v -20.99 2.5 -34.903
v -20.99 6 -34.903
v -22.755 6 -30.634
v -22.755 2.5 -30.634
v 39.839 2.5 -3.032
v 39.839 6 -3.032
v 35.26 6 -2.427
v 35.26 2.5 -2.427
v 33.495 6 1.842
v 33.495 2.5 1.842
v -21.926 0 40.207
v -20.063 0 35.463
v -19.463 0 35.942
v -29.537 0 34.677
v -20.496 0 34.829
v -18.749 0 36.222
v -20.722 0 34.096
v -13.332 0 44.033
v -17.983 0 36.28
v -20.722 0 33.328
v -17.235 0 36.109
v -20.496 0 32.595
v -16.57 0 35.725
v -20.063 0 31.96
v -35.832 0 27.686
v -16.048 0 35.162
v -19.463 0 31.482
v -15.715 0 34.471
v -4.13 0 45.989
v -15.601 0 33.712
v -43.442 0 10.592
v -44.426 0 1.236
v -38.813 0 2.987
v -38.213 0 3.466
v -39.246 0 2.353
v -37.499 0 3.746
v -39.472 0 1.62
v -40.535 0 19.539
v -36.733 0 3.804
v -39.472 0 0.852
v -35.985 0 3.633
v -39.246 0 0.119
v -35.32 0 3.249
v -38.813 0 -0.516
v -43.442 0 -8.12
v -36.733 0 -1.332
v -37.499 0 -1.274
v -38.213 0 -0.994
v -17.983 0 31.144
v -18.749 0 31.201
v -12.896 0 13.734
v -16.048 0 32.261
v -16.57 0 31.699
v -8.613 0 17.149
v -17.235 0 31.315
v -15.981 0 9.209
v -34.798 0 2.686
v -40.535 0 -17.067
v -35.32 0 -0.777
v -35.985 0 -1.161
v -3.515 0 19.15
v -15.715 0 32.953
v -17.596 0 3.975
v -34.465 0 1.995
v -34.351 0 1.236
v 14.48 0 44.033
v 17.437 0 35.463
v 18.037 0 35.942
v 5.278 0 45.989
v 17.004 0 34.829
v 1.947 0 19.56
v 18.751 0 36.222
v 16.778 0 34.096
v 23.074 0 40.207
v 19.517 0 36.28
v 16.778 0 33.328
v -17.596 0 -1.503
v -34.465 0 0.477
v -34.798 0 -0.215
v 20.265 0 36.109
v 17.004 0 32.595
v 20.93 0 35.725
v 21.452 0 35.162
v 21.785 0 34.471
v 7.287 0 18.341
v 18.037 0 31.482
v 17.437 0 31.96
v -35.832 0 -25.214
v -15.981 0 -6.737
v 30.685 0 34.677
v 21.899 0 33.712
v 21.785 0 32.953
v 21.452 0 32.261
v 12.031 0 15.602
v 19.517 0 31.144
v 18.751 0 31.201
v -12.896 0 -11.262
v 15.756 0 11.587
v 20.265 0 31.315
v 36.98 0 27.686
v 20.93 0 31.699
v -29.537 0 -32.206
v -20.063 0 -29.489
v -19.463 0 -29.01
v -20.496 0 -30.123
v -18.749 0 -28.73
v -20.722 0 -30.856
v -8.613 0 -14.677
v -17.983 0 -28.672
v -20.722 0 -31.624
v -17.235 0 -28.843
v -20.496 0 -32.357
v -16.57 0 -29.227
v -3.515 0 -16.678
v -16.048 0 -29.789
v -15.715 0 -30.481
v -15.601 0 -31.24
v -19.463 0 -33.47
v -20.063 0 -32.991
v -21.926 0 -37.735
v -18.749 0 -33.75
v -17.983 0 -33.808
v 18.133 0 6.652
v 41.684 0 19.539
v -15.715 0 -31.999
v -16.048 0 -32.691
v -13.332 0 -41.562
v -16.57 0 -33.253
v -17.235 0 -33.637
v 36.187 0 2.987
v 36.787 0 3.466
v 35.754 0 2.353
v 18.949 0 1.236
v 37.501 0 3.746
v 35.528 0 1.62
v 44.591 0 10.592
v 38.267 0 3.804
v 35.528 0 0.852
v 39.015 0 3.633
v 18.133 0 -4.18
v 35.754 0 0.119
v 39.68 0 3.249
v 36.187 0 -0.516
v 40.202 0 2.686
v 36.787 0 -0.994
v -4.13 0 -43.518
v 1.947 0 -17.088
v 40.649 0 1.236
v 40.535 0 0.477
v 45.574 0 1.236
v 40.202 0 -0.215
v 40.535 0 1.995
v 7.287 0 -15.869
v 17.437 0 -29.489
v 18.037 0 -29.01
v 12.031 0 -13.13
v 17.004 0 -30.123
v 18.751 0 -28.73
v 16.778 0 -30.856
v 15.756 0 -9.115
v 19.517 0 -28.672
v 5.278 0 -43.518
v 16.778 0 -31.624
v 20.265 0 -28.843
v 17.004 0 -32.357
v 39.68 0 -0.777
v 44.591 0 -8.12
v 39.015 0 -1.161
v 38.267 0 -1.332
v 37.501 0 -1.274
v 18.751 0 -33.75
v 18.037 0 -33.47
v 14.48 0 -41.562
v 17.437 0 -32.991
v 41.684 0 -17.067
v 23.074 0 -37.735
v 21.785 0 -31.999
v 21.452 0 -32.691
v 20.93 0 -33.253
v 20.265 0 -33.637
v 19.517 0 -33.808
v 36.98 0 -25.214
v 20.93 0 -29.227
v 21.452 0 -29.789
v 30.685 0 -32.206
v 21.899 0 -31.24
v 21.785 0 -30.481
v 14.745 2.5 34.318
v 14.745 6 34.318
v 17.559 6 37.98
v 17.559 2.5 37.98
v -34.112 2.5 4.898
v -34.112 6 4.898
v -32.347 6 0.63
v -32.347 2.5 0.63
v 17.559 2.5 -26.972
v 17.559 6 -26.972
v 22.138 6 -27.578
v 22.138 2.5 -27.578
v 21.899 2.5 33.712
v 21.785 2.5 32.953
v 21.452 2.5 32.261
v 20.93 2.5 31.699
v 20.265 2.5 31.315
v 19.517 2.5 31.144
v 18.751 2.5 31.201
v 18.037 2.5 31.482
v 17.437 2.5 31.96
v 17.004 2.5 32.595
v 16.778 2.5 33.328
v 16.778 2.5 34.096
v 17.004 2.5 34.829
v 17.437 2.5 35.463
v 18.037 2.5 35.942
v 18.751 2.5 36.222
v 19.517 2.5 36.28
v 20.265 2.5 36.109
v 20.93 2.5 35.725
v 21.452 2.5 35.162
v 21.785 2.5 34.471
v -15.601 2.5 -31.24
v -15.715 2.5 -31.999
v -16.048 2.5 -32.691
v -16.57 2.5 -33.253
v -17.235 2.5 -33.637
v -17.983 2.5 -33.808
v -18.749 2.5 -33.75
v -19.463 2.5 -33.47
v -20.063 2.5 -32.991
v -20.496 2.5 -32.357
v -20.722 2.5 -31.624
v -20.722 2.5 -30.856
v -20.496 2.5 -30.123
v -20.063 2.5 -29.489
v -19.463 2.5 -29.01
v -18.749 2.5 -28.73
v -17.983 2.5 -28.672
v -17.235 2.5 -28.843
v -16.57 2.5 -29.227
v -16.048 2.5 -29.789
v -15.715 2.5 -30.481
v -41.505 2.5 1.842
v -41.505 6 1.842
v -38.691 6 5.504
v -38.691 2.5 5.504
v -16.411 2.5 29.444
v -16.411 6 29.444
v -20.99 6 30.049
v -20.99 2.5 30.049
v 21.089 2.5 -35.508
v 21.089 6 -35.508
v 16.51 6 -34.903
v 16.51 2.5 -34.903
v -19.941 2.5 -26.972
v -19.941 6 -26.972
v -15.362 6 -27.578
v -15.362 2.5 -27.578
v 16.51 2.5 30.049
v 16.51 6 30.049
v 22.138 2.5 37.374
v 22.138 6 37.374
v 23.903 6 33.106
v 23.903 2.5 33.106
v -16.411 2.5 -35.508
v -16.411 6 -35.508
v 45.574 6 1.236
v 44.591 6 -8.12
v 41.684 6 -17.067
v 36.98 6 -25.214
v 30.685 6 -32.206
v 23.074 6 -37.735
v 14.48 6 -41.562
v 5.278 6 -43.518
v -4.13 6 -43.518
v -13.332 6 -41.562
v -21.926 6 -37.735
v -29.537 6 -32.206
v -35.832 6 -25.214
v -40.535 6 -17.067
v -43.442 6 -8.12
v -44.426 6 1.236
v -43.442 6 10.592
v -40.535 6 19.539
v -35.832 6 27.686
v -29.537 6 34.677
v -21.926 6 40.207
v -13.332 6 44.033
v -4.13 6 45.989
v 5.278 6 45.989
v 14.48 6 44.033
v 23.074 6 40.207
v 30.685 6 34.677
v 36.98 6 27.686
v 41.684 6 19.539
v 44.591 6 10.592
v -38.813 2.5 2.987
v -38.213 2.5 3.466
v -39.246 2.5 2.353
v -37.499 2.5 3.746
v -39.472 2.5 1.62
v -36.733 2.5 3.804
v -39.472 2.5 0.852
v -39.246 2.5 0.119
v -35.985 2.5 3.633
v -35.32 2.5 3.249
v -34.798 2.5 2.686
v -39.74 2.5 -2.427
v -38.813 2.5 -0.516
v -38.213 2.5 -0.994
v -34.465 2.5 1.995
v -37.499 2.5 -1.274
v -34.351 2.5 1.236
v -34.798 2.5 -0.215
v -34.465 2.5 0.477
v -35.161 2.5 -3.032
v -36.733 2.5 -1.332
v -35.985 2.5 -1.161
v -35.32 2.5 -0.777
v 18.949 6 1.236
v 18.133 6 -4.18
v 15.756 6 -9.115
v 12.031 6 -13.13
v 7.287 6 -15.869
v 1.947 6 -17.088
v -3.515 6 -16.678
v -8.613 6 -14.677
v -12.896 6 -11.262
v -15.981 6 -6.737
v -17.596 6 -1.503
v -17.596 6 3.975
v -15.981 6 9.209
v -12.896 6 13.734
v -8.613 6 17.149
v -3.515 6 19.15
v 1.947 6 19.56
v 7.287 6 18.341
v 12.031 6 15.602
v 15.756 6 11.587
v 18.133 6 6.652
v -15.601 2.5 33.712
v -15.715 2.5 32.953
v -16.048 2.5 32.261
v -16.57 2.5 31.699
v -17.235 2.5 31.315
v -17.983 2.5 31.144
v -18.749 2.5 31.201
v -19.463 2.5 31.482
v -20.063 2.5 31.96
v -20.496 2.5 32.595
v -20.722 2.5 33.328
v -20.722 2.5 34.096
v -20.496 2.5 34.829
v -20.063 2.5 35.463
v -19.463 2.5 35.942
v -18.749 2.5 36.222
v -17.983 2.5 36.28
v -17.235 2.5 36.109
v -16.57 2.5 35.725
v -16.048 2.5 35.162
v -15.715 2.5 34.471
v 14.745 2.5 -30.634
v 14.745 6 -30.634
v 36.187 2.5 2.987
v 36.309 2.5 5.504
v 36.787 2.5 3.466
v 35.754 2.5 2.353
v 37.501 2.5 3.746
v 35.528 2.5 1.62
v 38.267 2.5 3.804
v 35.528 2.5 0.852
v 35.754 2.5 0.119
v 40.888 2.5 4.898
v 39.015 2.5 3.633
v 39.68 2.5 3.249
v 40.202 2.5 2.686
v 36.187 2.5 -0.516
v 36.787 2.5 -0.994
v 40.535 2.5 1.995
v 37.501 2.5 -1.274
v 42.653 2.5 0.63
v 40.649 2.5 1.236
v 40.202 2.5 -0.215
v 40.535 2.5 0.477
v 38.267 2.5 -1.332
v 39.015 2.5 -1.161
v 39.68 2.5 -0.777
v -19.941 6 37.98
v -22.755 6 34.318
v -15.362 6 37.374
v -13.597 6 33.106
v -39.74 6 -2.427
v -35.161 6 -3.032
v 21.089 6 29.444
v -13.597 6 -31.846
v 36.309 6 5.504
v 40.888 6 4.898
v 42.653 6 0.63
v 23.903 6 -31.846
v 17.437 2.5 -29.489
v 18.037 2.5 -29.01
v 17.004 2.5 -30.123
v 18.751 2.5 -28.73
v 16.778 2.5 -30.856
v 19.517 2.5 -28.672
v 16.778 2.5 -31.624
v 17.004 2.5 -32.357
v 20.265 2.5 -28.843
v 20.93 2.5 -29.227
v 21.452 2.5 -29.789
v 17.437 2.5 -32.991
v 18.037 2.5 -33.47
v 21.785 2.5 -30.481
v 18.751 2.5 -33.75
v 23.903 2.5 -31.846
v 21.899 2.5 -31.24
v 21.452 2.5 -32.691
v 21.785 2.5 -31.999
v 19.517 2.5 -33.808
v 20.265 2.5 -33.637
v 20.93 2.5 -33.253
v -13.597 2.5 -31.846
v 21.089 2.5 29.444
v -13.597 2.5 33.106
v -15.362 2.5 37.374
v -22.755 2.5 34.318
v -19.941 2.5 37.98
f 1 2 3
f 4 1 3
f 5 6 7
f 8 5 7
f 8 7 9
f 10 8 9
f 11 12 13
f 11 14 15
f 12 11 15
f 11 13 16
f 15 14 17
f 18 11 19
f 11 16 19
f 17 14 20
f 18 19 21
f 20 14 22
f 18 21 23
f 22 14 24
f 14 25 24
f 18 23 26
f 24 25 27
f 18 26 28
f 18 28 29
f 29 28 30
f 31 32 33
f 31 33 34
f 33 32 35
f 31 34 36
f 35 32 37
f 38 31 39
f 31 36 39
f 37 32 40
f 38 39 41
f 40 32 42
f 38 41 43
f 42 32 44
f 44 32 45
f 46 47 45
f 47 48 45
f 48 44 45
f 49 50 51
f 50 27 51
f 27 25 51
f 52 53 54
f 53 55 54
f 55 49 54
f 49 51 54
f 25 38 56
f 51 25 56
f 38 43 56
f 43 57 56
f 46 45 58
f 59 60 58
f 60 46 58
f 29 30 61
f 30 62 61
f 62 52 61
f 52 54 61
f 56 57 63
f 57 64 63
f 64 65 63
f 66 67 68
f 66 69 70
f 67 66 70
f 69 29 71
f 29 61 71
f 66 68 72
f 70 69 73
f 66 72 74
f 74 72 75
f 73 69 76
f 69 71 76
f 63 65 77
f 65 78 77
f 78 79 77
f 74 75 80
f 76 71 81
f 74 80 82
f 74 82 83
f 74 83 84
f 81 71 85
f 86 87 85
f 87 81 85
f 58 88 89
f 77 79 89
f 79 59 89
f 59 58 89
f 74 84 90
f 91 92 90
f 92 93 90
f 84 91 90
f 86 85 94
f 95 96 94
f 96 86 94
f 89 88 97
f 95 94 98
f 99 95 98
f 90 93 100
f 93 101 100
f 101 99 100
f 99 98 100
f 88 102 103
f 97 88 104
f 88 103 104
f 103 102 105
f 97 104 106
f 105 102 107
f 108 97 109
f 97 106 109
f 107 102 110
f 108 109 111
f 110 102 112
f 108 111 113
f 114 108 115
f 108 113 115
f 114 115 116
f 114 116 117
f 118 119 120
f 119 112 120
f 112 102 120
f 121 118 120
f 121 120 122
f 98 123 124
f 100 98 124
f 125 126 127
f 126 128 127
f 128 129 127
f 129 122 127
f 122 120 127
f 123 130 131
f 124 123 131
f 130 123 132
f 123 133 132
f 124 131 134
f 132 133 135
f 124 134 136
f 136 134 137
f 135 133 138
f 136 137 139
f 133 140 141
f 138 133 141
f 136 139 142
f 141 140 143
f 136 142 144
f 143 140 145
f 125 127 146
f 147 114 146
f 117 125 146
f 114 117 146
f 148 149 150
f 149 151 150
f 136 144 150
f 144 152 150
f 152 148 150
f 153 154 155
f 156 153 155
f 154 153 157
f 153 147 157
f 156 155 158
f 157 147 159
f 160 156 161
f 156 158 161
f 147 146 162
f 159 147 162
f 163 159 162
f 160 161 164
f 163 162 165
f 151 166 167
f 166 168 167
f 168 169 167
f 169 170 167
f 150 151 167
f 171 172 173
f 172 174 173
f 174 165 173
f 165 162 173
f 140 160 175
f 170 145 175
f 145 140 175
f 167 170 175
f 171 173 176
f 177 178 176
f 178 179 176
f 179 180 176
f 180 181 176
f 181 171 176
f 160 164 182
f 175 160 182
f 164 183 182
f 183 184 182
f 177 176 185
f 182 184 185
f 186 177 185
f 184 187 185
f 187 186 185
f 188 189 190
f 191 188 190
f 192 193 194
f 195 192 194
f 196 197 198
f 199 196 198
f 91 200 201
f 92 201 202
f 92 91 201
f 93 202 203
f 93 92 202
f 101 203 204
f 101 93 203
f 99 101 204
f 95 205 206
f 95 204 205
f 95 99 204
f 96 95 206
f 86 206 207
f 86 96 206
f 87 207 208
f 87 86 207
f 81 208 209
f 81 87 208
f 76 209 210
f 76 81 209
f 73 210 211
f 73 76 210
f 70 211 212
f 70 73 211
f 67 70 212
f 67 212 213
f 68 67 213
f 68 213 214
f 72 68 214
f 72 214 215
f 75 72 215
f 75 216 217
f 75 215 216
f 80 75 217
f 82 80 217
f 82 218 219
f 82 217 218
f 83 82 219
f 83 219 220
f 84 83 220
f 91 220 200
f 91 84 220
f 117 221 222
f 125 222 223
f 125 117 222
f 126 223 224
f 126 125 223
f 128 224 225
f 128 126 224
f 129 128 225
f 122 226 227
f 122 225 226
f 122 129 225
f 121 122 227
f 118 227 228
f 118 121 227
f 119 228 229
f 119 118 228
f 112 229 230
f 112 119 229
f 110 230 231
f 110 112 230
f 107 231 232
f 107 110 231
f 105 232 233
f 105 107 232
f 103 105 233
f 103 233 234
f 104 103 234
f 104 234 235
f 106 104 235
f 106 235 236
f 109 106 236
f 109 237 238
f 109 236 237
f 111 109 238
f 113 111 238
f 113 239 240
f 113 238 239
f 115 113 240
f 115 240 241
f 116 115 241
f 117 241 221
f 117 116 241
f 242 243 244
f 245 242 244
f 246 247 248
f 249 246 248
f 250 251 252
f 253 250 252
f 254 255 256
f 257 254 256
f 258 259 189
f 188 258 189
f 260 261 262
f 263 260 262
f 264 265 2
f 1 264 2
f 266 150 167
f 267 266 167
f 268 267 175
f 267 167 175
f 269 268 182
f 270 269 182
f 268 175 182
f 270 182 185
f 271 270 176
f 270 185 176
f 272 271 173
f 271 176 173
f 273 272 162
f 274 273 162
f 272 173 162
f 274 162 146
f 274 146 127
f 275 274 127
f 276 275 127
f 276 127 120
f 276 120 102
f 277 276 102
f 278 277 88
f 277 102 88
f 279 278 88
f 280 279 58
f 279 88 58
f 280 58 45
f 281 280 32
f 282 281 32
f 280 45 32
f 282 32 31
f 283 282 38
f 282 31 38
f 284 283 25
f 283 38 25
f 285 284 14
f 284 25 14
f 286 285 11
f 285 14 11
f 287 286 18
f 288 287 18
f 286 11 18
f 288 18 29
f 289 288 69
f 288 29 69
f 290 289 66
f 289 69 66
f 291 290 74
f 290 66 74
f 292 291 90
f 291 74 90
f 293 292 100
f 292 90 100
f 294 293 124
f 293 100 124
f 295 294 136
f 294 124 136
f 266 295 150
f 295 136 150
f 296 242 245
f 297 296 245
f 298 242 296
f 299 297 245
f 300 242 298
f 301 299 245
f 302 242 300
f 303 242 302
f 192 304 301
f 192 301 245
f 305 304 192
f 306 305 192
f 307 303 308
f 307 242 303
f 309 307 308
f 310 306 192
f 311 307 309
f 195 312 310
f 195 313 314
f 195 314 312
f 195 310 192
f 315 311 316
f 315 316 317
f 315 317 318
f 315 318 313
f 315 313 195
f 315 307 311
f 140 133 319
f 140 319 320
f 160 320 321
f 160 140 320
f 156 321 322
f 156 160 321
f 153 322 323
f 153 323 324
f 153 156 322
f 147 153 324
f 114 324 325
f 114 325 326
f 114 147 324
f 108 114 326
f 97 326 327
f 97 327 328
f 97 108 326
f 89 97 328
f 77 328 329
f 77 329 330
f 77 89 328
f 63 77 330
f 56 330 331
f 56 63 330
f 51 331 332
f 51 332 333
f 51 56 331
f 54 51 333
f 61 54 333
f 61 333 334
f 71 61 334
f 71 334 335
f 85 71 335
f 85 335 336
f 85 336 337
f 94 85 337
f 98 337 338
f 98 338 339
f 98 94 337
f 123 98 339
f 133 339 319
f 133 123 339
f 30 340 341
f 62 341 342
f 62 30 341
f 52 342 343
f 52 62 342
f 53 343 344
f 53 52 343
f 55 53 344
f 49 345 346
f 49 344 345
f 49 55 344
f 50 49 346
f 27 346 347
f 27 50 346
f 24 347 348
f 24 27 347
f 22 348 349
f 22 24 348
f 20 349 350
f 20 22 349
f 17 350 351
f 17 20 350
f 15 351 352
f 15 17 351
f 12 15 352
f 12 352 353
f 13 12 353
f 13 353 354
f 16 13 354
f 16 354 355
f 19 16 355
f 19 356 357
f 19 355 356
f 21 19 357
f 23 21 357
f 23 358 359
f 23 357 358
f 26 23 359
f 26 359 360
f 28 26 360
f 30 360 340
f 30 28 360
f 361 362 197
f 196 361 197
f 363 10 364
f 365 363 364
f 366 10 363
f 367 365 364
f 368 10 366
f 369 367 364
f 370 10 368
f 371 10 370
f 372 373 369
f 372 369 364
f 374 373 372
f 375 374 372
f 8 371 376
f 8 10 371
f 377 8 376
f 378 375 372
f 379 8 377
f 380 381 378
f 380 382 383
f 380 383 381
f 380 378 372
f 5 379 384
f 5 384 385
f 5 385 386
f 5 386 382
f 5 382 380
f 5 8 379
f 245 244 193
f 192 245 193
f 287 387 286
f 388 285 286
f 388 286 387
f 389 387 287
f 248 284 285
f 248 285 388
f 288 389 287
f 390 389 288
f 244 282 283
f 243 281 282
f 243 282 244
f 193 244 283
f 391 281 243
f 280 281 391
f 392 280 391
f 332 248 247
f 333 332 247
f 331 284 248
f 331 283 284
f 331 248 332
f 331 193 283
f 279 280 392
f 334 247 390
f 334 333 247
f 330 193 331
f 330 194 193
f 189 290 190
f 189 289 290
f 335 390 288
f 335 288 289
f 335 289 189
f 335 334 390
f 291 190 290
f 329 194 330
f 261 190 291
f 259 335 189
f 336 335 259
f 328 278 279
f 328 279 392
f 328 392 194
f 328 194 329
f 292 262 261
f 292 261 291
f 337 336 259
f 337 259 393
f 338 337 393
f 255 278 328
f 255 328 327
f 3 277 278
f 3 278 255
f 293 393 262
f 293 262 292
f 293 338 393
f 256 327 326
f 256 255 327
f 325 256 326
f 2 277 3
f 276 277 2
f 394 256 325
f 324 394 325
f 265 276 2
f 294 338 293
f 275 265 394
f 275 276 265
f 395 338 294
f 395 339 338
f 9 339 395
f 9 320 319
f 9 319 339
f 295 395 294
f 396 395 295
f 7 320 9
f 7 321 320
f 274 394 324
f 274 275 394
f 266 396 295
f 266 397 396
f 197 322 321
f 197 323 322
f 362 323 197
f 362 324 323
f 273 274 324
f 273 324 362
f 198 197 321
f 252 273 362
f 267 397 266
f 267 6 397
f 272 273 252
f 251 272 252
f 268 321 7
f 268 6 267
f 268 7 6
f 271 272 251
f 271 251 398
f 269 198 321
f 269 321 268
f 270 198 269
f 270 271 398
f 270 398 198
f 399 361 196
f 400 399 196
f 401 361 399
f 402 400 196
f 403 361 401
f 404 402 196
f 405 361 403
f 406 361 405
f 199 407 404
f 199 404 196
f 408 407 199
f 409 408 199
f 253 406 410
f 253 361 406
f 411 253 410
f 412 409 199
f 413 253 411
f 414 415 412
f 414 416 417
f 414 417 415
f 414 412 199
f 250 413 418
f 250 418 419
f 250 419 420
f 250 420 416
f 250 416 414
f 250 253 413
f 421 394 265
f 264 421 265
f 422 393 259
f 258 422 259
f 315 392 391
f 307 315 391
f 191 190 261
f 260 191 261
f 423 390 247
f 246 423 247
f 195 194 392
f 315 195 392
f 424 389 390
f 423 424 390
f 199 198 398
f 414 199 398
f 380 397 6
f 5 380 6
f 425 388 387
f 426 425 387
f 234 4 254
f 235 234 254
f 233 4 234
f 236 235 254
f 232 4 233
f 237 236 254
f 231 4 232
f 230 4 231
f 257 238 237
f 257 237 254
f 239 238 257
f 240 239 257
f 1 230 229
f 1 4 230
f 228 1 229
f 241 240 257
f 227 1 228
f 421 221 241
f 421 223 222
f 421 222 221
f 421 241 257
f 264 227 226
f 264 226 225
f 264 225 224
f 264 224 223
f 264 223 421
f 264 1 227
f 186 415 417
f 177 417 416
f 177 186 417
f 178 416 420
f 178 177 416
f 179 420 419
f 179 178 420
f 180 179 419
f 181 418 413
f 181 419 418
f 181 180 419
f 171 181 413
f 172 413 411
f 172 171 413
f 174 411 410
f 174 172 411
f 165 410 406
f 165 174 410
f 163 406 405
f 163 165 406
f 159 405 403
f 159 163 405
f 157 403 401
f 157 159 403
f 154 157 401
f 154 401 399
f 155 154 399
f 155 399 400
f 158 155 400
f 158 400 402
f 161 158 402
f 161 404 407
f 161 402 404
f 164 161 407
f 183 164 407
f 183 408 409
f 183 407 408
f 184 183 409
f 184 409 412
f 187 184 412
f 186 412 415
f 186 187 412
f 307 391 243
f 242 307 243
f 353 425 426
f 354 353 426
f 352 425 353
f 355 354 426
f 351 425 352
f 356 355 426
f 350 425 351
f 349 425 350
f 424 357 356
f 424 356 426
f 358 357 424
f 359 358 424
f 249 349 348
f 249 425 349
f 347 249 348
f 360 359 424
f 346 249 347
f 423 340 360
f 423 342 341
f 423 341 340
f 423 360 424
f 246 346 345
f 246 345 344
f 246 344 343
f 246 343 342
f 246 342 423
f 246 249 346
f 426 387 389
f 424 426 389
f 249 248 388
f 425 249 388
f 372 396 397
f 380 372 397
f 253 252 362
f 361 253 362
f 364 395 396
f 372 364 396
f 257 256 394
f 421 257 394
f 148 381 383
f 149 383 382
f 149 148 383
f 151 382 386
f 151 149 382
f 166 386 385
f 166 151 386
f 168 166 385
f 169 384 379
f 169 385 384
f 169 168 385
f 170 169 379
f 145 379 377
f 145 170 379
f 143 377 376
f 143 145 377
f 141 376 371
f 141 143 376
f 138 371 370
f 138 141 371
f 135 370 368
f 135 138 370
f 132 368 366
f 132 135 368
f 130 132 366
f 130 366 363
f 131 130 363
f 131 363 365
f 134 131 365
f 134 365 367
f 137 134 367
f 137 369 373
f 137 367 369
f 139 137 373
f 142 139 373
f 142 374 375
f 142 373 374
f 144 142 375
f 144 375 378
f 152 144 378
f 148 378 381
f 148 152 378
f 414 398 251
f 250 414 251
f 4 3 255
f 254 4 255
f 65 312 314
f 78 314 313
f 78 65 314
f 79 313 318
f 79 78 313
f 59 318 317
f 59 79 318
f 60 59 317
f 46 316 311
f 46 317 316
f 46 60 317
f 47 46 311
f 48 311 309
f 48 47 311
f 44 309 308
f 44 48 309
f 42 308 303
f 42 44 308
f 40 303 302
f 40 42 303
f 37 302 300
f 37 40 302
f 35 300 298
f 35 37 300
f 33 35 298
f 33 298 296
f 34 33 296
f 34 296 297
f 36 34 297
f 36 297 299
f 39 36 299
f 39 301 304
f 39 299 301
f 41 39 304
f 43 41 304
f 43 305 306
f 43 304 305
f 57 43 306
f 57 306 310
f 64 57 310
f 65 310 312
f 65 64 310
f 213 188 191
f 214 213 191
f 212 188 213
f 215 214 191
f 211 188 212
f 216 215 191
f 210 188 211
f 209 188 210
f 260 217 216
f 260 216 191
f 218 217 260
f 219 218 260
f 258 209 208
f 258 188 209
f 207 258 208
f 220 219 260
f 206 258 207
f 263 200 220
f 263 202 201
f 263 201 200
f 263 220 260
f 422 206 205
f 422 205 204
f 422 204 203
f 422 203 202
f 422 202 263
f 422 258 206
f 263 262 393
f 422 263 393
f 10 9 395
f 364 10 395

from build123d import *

# Parameters (mm, degrees)
SKETCH2_R           = 45
SKETCH2_R_2         = 18.375
BOSS_EXTRUDE1_DEPTH = 6
SKETCH2_3_R         = 2.575
CUT_EXTRUDE1_DEPTH  = 7
CUT_EXTRUDE3_START  = 6
CUT_EXTRUDE3_DEPTH  = 3.5


with BuildPart() as part:
    # Sketch2 → Boss-Extrude1 (new body)
    with BuildSketch(Plane(origin=(0, 0, 0), x_dir=(1, 0, 0), z_dir=(0, 1, 0))):
        with Locations((0.5741705, -1.235944224)):
            Circle(SKETCH2_R)
        with Locations((0.5741705, -1.235944224)):
            Circle(SKETCH2_R_2, mode=Mode.SUBTRACT)
    extrude(amount=BOSS_EXTRUDE1_DEPTH)

    # Sketch2<3> → Cut-Extrude1 (cut, through all)
    with BuildSketch(Plane(origin=(0, 0, 0), x_dir=(1, 0, 0), z_dir=(0, 1, 0))):
        with Locations((-18.1758295, 31.240008418)):
            Circle(SKETCH2_3_R)
        with Locations((19.3241705, 31.240008418)):
            Circle(SKETCH2_3_R)
        with Locations((38.0741705, -1.235944224)):
            Circle(SKETCH2_3_R)
        with Locations((19.3241705, -33.711896866)):
            Circle(SKETCH2_3_R)
        with Locations((-18.1758295, -33.711896866)):
            Circle(SKETCH2_3_R)
        with Locations((-36.9258295, -1.235944224)):
            Circle(SKETCH2_3_R)
    extrude(amount=CUT_EXTRUDE1_DEPTH, mode=Mode.SUBTRACT)

    # Sketch2<5> → Cut-Extrude3 (cut)
    with BuildSketch(Plane(origin=(0, 0, 0), x_dir=(1, 0, 0), z_dir=(0, 1, 0)).offset(CUT_EXTRUDE3_START)):
        Polygon((22.138316387, 27.577507051), (23.903062668, 31.845879563), (21.088916781, 35.508380929), (16.510024613, 34.902509784), (14.745278332, 30.634137273), (17.559424219, 26.971635906), align=None)
        Polygon((-15.361683613, 27.577507051), (-13.596937332, 31.845879563), (-16.411083219, 35.508380929), (-20.989975387, 34.902509784), (-22.754721668, 30.634137273), (-19.940575781, 26.971635906), align=None)
        Polygon((36.309424219, -5.504316736), (40.888316387, -4.898445591), (42.653062668, -0.630073079), (39.838916781, 3.032428287), (35.260024613, 2.426557142), (33.495278332, -1.841815369), align=None)
        Polygon((14.745278332, -34.317768011), (17.559424219, -37.980269378), (22.138316387, -37.374398233), (23.903062668, -33.106025721), (21.088916781, -29.443524355), (16.510024613, -30.0493955), align=None)
        Polygon((-20.989975387, -30.0493955), (-22.754721668, -34.317768011), (-19.940575781, -37.980269378), (-15.361683613, -37.374398233), (-13.596937332, -33.106025721), (-16.411083219, -29.443524355), align=None)
        Polygon((-35.161083219, 3.032428287), (-39.739975387, 2.426557142), (-41.504721668, -1.841815369), (-38.690575781, -5.504316736), (-34.111683613, -4.898445591), (-32.346937332, -0.630073079), align=None)
    extrude(amount=-CUT_EXTRUDE3_DEPTH, mode=Mode.SUBTRACT)


solid = part.part
